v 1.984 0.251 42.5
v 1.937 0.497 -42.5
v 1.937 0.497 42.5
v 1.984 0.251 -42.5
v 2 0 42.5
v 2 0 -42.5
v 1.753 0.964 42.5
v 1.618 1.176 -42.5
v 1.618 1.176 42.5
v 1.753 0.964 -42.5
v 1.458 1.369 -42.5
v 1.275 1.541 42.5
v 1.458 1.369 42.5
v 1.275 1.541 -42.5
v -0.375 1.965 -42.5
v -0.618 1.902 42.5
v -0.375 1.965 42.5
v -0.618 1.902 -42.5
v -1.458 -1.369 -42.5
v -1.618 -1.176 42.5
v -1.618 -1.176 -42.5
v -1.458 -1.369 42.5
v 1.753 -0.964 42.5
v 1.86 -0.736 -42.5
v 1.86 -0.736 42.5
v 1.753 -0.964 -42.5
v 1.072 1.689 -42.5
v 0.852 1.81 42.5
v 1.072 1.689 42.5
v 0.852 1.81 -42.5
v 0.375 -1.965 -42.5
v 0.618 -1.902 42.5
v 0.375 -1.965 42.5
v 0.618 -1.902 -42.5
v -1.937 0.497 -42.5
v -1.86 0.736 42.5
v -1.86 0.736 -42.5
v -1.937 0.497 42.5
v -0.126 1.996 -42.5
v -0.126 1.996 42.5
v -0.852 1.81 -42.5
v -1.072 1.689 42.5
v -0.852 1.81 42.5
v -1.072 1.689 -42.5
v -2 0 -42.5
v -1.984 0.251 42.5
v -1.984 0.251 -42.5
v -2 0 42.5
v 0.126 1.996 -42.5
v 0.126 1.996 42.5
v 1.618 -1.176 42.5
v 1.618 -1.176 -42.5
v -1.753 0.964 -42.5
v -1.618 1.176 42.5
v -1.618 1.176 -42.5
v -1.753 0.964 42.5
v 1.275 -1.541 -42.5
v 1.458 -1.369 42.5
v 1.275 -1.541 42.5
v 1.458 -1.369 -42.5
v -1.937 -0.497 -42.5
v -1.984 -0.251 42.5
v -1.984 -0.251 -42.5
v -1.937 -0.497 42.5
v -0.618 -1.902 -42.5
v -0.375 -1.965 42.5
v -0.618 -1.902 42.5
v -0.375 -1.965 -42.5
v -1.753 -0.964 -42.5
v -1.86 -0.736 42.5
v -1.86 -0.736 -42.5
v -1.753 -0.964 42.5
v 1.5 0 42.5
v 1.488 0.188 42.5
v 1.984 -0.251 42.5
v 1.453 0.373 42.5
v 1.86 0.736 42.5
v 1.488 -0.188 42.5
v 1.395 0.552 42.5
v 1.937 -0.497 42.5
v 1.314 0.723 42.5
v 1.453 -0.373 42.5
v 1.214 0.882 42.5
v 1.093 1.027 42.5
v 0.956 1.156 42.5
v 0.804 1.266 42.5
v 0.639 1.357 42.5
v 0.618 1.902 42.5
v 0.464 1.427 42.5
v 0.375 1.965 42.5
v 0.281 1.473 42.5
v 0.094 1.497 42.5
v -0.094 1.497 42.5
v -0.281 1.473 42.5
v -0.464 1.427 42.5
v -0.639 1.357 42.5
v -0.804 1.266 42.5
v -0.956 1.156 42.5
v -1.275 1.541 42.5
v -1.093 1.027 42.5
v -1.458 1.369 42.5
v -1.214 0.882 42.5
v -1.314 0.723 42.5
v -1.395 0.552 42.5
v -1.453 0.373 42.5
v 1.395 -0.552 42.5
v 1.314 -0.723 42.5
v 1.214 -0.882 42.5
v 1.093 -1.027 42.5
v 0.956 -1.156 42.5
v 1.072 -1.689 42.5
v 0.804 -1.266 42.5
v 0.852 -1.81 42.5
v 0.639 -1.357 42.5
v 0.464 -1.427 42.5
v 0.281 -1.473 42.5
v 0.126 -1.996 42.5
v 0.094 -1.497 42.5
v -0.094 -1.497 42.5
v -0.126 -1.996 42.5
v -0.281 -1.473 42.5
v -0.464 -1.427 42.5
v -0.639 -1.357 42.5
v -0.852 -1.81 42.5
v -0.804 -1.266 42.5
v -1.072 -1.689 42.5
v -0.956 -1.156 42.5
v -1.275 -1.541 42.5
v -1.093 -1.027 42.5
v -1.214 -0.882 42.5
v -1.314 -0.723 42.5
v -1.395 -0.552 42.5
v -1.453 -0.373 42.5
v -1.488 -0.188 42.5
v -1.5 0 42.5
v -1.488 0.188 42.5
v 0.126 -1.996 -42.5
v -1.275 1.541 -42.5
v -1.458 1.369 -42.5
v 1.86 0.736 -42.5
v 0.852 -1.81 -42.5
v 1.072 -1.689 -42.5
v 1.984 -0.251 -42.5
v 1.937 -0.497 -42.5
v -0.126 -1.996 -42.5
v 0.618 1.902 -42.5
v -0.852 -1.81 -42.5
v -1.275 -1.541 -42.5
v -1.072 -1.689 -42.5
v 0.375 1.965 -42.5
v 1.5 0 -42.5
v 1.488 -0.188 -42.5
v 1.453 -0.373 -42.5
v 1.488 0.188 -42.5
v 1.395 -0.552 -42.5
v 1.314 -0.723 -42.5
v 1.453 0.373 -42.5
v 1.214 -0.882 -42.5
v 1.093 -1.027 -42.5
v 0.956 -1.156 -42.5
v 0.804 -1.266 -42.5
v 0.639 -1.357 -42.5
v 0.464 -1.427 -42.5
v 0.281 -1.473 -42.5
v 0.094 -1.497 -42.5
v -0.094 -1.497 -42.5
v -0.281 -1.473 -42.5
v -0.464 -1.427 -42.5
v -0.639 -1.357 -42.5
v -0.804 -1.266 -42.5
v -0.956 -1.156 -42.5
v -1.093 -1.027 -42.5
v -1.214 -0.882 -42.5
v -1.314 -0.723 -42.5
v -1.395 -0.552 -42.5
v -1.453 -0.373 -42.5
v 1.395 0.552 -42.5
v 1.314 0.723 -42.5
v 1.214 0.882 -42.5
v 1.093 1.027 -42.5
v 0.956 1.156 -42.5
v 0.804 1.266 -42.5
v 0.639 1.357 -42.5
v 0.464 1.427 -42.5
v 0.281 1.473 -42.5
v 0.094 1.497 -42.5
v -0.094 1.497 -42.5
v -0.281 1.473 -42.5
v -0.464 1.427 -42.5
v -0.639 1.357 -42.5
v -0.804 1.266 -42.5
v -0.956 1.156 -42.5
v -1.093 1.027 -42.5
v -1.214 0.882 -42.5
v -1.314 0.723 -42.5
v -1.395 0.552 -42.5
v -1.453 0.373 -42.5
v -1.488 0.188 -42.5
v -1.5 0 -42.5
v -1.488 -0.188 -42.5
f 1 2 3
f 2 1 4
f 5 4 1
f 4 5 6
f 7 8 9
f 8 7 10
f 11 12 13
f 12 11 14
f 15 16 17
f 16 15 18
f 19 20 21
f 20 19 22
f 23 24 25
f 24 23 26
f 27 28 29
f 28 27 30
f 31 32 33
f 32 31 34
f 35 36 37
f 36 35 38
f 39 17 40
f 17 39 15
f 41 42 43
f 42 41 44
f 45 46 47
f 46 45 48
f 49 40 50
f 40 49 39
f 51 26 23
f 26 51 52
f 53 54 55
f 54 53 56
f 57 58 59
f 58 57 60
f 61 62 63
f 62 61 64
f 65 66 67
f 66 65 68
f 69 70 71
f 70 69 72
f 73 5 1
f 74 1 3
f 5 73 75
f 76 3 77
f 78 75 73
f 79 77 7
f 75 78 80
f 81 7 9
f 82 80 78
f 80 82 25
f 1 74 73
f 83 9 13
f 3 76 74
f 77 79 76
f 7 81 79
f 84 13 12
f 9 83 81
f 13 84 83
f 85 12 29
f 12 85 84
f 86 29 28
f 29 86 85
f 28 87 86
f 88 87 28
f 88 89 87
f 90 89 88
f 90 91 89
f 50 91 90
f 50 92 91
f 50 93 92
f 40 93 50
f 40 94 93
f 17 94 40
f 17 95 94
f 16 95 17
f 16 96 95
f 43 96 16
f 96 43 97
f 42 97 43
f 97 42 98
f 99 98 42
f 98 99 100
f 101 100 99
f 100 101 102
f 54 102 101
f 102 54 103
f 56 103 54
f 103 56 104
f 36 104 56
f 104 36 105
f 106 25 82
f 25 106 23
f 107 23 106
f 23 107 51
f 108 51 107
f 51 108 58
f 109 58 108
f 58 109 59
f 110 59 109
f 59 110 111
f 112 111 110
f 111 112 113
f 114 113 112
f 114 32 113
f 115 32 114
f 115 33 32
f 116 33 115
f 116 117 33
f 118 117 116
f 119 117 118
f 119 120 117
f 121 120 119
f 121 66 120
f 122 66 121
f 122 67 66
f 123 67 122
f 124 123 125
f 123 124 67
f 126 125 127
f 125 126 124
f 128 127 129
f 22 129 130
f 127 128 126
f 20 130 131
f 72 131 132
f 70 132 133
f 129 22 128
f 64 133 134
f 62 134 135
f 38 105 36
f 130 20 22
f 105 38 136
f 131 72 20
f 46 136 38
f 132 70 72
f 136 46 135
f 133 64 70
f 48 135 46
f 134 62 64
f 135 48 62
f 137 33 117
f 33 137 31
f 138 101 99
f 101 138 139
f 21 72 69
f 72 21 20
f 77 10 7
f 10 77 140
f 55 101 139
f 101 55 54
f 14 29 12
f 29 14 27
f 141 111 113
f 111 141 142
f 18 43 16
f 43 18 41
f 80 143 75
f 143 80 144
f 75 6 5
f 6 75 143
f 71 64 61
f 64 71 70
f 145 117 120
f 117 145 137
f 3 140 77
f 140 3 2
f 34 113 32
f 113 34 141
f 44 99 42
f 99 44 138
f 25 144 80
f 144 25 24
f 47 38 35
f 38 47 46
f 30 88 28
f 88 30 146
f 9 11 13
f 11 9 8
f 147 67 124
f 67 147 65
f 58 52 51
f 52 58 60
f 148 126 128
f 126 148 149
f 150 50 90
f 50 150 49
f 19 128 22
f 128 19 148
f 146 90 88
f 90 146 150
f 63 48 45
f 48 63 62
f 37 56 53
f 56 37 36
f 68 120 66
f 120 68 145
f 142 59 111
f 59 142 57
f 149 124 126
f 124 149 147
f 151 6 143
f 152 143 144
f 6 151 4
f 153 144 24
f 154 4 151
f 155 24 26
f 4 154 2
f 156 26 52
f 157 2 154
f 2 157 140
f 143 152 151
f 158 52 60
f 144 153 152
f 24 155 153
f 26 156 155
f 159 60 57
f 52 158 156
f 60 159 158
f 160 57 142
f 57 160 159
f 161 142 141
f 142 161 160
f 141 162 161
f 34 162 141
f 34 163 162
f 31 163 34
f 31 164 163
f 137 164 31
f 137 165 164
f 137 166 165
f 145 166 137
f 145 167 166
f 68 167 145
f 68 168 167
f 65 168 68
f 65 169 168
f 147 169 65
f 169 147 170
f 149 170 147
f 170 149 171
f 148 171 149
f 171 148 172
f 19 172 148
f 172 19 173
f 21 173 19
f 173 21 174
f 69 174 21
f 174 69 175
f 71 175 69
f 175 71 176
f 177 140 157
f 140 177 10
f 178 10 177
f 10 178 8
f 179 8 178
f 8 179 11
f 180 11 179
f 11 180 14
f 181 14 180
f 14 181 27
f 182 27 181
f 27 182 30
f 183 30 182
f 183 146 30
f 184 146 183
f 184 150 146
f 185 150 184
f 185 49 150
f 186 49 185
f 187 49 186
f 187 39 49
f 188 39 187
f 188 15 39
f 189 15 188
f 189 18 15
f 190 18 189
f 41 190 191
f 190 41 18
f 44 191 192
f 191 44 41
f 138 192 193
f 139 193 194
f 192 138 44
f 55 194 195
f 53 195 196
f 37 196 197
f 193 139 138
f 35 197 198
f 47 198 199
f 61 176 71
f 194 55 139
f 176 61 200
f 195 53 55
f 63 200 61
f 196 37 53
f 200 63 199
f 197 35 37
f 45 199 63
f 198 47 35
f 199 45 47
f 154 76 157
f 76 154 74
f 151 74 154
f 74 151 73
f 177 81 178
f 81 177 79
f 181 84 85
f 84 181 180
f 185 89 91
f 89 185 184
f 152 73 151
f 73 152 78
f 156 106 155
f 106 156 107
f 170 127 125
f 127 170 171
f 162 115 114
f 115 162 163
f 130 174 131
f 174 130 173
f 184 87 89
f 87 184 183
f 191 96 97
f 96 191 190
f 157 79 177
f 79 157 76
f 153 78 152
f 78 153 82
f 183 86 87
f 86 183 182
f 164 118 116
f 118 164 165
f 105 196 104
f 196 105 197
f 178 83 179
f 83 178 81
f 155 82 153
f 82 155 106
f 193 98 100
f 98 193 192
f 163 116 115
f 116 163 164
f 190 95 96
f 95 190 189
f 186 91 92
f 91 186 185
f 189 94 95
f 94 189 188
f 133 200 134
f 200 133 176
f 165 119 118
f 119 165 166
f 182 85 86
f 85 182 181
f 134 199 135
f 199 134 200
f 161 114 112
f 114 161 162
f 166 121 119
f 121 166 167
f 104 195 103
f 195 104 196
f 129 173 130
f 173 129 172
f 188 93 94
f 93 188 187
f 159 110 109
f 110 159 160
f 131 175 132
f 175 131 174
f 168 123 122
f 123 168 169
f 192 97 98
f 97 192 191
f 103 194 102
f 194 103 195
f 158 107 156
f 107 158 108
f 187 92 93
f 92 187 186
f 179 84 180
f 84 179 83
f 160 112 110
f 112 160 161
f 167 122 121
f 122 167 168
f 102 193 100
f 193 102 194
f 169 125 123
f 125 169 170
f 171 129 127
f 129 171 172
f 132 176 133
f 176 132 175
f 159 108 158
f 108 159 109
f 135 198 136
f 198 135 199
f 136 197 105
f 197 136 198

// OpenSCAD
$fn = 50;


difference() {
	union() {
		translate(v = [0, 0, -42.5000000000]) {
			cylinder(h = 85, r = 2.0000000000);
		}
	}
	union() {
		translate(v = [0, 0, -100.0000000000]) {
			cylinder(h = 200, r = 1.5000000000);
		}
	}
}
